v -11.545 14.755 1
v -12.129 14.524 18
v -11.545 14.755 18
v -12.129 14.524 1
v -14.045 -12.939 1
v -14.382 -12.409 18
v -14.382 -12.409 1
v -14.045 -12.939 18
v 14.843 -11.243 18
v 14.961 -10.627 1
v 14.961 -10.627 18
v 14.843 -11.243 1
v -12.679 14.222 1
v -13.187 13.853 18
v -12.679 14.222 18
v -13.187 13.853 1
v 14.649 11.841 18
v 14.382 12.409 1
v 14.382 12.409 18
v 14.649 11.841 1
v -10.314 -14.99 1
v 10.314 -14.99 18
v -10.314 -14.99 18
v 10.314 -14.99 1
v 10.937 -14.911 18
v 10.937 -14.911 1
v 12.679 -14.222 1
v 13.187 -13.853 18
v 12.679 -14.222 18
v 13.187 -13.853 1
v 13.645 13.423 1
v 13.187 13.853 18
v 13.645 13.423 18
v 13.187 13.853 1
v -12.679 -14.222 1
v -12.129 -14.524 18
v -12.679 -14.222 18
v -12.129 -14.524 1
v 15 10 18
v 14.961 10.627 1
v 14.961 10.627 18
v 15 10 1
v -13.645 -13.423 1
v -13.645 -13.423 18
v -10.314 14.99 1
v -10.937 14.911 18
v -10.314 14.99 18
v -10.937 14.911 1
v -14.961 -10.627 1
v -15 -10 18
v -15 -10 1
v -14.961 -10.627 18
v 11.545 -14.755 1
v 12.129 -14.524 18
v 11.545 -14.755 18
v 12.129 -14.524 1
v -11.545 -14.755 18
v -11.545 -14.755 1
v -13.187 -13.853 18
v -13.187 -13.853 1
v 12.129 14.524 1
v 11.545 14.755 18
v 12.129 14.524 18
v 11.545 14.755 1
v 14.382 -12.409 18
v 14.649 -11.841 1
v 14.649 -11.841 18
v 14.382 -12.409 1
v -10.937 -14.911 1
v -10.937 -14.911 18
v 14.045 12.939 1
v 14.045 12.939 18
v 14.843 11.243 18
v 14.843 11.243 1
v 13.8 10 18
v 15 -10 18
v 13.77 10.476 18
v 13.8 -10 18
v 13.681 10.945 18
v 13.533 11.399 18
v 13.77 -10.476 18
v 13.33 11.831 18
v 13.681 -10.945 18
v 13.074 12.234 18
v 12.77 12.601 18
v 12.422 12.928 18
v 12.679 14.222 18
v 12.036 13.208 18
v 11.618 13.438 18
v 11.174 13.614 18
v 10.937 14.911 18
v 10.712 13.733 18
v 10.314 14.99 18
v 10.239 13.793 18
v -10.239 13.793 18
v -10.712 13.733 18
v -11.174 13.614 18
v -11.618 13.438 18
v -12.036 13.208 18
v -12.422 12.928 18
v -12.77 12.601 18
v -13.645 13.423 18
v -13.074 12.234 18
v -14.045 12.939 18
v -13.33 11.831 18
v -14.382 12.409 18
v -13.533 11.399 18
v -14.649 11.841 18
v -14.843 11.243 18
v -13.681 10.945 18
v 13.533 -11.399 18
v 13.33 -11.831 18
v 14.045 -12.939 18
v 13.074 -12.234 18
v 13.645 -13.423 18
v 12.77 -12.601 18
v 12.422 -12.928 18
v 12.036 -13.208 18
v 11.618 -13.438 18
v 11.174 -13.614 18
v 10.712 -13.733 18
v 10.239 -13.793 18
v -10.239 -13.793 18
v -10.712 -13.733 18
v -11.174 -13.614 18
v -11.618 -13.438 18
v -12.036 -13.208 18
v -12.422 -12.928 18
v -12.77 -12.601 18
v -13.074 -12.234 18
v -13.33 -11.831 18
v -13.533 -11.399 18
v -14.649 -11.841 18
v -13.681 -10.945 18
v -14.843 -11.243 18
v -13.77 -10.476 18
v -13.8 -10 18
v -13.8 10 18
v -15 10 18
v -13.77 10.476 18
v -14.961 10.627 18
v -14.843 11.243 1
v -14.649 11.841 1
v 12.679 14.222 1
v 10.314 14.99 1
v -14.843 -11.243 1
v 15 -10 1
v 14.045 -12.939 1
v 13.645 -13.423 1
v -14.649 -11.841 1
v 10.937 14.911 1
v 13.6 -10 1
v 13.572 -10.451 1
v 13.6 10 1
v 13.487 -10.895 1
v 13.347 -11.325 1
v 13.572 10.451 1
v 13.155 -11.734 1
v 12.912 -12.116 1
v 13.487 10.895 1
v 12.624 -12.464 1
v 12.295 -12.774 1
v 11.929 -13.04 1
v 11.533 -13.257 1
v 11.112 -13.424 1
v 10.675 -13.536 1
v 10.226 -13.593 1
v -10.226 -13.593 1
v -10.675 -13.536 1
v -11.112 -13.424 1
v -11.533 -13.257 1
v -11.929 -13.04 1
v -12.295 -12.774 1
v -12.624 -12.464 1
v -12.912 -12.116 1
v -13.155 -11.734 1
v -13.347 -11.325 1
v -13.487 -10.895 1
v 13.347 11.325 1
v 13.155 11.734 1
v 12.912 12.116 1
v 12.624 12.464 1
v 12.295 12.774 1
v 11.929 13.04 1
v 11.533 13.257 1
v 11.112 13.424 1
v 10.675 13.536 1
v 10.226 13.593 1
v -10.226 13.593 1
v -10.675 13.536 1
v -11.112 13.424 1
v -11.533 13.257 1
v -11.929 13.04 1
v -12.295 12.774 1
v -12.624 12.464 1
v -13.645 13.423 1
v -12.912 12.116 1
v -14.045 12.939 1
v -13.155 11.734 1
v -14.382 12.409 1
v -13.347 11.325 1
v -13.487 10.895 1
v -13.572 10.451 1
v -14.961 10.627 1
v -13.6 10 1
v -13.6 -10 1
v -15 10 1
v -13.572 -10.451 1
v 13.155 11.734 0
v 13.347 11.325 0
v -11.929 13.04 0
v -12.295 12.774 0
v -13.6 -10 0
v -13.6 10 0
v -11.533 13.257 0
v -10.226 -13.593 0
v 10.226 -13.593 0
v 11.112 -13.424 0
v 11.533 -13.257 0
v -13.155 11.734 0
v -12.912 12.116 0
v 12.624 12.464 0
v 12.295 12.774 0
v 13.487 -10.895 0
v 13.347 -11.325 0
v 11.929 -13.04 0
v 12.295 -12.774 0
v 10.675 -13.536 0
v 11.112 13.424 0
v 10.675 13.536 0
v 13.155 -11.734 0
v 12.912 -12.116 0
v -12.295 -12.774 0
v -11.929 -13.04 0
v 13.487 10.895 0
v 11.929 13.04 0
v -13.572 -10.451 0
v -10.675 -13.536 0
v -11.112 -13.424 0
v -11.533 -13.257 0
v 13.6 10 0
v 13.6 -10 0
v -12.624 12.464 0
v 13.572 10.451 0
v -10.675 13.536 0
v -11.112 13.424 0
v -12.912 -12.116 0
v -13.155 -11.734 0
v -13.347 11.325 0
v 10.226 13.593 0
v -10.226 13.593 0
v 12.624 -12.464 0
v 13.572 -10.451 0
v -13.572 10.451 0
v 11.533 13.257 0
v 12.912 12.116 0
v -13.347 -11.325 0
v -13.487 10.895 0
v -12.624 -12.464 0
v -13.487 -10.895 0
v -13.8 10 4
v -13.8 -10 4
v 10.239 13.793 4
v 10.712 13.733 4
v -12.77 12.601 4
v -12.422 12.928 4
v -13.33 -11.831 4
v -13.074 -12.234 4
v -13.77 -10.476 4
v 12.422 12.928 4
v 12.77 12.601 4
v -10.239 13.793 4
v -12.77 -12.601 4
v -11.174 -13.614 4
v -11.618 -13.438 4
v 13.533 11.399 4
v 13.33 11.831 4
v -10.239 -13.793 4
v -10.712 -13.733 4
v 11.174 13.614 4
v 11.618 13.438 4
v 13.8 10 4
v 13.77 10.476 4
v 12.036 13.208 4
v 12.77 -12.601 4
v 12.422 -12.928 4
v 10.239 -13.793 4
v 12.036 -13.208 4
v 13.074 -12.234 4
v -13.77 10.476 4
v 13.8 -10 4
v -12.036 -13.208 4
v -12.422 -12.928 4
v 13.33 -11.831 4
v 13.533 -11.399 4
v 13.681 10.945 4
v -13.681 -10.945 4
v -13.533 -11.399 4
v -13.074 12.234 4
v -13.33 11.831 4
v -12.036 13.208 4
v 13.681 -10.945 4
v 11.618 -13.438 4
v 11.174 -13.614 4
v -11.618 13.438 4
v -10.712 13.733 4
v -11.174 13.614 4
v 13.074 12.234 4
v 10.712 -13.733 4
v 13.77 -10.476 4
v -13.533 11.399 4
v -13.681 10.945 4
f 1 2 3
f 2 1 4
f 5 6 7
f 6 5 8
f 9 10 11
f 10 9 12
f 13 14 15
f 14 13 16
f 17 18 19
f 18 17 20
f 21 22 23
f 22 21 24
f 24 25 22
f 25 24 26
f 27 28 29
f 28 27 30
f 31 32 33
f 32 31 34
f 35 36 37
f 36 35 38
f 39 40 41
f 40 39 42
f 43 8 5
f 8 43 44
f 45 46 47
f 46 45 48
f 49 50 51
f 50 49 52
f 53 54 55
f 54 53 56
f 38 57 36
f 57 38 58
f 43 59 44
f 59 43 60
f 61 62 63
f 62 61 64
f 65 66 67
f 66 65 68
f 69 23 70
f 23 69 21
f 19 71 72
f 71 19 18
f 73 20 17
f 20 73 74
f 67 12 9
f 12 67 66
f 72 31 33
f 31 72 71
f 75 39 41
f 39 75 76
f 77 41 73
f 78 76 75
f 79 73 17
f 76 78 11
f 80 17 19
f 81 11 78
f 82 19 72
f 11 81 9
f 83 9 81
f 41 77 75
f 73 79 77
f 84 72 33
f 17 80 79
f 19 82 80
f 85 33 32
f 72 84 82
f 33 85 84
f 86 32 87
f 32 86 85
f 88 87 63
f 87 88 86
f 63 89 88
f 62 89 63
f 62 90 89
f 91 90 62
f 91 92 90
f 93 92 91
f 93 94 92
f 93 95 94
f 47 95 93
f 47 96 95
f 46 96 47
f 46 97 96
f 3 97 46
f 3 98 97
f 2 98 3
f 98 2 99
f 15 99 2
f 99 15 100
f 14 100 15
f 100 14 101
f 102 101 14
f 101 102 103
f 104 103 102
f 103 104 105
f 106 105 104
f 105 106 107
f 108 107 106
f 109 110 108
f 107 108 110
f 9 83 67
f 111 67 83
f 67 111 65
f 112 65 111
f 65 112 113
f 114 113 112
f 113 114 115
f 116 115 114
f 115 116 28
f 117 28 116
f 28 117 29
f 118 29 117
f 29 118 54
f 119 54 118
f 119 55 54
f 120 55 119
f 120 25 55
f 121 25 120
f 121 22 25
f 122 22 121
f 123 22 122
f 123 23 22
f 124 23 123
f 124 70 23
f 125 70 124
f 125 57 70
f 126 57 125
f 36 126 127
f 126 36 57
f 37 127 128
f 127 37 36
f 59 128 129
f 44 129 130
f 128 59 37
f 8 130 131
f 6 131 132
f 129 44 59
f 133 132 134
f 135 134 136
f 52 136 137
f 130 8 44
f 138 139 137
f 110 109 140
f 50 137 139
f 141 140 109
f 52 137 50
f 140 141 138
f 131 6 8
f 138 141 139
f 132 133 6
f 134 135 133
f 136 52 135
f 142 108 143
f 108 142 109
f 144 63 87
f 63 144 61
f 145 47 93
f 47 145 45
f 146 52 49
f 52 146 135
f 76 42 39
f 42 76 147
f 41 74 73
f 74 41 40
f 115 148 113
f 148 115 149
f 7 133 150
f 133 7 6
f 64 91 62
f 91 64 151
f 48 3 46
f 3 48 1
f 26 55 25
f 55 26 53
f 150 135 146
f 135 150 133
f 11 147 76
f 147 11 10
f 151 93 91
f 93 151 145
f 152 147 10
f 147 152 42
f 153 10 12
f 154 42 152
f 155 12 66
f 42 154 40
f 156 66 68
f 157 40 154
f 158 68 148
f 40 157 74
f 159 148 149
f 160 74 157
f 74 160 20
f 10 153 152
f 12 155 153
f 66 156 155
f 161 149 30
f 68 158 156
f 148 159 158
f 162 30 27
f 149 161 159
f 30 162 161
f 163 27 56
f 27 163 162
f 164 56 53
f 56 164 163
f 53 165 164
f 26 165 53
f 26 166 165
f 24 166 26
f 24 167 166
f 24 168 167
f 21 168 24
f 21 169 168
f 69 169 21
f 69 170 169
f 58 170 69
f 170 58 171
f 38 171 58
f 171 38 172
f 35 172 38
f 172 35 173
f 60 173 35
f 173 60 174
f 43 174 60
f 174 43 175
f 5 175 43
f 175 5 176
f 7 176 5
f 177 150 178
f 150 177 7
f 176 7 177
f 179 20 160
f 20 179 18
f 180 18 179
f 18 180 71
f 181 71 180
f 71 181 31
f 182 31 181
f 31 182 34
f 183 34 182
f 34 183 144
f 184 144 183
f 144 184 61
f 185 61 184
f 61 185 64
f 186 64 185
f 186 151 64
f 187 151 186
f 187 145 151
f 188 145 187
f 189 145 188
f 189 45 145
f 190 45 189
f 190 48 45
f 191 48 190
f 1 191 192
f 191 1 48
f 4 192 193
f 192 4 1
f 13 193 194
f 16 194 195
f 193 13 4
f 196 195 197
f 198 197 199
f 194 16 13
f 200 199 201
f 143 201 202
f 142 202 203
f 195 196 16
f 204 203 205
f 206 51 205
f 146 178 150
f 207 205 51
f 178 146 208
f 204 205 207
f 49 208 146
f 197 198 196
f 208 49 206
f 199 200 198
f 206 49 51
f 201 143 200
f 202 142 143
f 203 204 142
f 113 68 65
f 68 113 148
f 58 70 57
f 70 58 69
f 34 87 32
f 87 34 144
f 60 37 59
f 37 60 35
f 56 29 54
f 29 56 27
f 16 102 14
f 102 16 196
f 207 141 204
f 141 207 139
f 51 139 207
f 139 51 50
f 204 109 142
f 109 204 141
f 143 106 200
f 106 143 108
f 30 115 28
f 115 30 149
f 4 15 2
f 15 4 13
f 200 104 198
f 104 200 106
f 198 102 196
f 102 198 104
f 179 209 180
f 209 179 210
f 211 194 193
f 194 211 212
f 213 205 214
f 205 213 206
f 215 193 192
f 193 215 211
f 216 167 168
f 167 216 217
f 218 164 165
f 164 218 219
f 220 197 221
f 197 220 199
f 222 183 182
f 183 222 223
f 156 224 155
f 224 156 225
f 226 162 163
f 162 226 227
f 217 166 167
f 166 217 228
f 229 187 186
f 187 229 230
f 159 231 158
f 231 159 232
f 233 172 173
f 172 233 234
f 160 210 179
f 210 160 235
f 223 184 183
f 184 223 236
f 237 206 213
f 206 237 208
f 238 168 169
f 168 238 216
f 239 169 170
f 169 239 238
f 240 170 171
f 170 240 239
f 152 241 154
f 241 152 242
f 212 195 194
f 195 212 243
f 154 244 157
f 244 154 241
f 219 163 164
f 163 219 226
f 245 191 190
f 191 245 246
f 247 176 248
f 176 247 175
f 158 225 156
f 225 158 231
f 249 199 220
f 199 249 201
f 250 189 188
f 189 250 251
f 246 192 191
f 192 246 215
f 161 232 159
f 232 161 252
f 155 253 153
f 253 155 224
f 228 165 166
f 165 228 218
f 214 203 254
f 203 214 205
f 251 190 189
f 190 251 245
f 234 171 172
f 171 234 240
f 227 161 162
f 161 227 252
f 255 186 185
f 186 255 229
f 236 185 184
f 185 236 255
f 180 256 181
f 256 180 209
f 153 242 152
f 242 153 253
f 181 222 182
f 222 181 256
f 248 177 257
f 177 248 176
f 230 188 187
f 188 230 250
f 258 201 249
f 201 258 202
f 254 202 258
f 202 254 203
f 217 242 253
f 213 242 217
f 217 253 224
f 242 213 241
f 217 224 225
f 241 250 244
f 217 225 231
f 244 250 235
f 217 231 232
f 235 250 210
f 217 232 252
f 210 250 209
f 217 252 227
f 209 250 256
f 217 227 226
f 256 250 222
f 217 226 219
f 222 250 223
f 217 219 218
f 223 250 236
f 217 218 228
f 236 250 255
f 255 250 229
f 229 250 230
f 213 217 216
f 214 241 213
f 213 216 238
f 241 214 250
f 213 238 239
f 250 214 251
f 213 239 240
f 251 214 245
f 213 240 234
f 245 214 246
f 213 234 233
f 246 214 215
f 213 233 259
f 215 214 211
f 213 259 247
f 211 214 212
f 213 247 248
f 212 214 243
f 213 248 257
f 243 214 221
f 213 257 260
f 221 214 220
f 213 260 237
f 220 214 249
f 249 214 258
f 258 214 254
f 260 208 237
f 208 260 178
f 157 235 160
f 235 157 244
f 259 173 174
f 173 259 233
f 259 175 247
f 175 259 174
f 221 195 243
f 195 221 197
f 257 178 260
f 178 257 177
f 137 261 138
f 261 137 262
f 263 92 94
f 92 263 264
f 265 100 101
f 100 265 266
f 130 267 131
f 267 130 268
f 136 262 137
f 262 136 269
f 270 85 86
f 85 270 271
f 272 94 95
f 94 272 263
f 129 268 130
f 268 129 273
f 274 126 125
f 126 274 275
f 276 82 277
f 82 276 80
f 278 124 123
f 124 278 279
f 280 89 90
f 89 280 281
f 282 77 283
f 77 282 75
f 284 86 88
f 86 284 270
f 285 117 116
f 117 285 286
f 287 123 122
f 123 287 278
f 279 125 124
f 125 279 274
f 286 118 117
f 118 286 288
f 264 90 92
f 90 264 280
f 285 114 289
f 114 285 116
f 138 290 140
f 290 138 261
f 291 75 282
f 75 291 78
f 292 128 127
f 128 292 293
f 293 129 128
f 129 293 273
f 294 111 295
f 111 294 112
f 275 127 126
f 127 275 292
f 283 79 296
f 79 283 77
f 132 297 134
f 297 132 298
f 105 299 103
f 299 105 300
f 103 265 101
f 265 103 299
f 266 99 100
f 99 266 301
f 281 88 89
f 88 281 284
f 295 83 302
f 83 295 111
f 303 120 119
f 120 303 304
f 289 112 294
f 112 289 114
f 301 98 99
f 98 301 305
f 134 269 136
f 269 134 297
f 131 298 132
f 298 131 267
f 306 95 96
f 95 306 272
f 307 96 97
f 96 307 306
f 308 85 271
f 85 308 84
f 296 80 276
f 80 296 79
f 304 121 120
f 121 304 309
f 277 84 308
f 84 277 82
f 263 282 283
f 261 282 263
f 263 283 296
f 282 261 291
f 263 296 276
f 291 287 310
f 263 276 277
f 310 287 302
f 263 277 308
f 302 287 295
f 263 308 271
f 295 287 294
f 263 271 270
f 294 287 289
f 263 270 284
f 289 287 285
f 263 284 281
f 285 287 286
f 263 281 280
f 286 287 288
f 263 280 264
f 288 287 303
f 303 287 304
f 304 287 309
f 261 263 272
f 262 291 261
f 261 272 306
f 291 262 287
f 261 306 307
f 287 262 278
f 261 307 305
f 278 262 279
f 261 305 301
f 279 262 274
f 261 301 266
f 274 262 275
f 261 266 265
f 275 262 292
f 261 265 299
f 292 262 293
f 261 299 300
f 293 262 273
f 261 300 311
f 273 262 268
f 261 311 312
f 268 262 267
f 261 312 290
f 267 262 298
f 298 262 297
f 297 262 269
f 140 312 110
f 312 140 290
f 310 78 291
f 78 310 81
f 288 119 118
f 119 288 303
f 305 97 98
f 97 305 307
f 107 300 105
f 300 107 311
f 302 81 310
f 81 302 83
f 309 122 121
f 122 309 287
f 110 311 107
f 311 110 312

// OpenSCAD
$fn = 50;


difference() {
	union() {
		translate(v = [0, 0, 1]) {
			hull() {
				translate(v = [-10.0000000000, 10.0000000000, 0]) {
					cylinder(h = 17, r = 5);
				}
				translate(v = [10.0000000000, 10.0000000000, 0]) {
					cylinder(h = 17, r = 5);
				}
				translate(v = [-10.0000000000, -10.0000000000, 0]) {
					cylinder(h = 17, r = 5);
				}
				translate(v = [10.0000000000, -10.0000000000, 0]) {
					cylinder(h = 17, r = 5);
				}
			}
		}
		translate(v = [0.0000000000, 0.0000000000, 11]) {
			rotate(a = [0, 180, 0]) {
				hull() {
					translate(v = [-10.0000000000, 10.0000000000, 0]) {
						cylinder(h = 11, r = 3.6000000000);
					}
					translate(v = [10.0000000000, 10.0000000000, 0]) {
						cylinder(h = 11, r = 3.6000000000);
					}
					translate(v = [-10.0000000000, -10.0000000000, 0]) {
						cylinder(h = 11, r = 3.6000000000);
					}
					translate(v = [10.0000000000, -10.0000000000, 0]) {
						cylinder(h = 11, r = 3.6000000000);
					}
				}
			}
		}
		translate(v = [0.0000000000, 0.0000000000, 13]) {
			rotate(a = [0, 180, 0]) {
				hull() {
					translate(v = [-10.0000000000, 10.0000000000, 0]) {
						cylinder(h = 2, r = 3.6000000000);
					}
					translate(v = [10.0000000000, 10.0000000000, 0]) {
						cylinder(h = 2, r = 3.6000000000);
					}
					translate(v = [-10.0000000000, -10.0000000000, 0]) {
						cylinder(h = 2, r = 3.6000000000);
					}
					translate(v = [10.0000000000, -10.0000000000, 0]) {
						cylinder(h = 2, r = 3.6000000000);
					}
				}
			}
		}
	}
	union() {
		translate(v = [0, 0, 4]) {
			hull() {
				translate(v = [-10.0000000000, 10.0000000000, 0]) {
					cylinder(h = 14, r = 3.8000000000);
				}
				translate(v = [10.0000000000, 10.0000000000, 0]) {
					cylinder(h = 14, r = 3.8000000000);
				}
				translate(v = [-10.0000000000, -10.0000000000, 0]) {
					cylinder(h = 14, r = 3.8000000000);
				}
				translate(v = [10.0000000000, -10.0000000000, 0]) {
					cylinder(h = 14, r = 3.8000000000);
				}
			}
		}
		translate(v = [0.0000000000, 0.0000000000, 14.5000000000]) {
			rotate(a = [0, 180, 0]) {
				hull() {
					translate(v = [-10.0000000000, 10.0000000000, 0]) {
						cylinder(h = 3.0000000000, r = 2.4000000000);
					}
					translate(v = [10.0000000000, 10.0000000000, 0]) {
						cylinder(h = 3.0000000000, r = 2.4000000000);
					}
					translate(v = [-10.0000000000, -10.0000000000, 0]) {
						cylinder(h = 3.0000000000, r = 2.4000000000);
					}
					translate(v = [10.0000000000, -10.0000000000, 0]) {
						cylinder(h = 3.0000000000, r = 2.4000000000);
					}
				}
			}
		}
	}
}
